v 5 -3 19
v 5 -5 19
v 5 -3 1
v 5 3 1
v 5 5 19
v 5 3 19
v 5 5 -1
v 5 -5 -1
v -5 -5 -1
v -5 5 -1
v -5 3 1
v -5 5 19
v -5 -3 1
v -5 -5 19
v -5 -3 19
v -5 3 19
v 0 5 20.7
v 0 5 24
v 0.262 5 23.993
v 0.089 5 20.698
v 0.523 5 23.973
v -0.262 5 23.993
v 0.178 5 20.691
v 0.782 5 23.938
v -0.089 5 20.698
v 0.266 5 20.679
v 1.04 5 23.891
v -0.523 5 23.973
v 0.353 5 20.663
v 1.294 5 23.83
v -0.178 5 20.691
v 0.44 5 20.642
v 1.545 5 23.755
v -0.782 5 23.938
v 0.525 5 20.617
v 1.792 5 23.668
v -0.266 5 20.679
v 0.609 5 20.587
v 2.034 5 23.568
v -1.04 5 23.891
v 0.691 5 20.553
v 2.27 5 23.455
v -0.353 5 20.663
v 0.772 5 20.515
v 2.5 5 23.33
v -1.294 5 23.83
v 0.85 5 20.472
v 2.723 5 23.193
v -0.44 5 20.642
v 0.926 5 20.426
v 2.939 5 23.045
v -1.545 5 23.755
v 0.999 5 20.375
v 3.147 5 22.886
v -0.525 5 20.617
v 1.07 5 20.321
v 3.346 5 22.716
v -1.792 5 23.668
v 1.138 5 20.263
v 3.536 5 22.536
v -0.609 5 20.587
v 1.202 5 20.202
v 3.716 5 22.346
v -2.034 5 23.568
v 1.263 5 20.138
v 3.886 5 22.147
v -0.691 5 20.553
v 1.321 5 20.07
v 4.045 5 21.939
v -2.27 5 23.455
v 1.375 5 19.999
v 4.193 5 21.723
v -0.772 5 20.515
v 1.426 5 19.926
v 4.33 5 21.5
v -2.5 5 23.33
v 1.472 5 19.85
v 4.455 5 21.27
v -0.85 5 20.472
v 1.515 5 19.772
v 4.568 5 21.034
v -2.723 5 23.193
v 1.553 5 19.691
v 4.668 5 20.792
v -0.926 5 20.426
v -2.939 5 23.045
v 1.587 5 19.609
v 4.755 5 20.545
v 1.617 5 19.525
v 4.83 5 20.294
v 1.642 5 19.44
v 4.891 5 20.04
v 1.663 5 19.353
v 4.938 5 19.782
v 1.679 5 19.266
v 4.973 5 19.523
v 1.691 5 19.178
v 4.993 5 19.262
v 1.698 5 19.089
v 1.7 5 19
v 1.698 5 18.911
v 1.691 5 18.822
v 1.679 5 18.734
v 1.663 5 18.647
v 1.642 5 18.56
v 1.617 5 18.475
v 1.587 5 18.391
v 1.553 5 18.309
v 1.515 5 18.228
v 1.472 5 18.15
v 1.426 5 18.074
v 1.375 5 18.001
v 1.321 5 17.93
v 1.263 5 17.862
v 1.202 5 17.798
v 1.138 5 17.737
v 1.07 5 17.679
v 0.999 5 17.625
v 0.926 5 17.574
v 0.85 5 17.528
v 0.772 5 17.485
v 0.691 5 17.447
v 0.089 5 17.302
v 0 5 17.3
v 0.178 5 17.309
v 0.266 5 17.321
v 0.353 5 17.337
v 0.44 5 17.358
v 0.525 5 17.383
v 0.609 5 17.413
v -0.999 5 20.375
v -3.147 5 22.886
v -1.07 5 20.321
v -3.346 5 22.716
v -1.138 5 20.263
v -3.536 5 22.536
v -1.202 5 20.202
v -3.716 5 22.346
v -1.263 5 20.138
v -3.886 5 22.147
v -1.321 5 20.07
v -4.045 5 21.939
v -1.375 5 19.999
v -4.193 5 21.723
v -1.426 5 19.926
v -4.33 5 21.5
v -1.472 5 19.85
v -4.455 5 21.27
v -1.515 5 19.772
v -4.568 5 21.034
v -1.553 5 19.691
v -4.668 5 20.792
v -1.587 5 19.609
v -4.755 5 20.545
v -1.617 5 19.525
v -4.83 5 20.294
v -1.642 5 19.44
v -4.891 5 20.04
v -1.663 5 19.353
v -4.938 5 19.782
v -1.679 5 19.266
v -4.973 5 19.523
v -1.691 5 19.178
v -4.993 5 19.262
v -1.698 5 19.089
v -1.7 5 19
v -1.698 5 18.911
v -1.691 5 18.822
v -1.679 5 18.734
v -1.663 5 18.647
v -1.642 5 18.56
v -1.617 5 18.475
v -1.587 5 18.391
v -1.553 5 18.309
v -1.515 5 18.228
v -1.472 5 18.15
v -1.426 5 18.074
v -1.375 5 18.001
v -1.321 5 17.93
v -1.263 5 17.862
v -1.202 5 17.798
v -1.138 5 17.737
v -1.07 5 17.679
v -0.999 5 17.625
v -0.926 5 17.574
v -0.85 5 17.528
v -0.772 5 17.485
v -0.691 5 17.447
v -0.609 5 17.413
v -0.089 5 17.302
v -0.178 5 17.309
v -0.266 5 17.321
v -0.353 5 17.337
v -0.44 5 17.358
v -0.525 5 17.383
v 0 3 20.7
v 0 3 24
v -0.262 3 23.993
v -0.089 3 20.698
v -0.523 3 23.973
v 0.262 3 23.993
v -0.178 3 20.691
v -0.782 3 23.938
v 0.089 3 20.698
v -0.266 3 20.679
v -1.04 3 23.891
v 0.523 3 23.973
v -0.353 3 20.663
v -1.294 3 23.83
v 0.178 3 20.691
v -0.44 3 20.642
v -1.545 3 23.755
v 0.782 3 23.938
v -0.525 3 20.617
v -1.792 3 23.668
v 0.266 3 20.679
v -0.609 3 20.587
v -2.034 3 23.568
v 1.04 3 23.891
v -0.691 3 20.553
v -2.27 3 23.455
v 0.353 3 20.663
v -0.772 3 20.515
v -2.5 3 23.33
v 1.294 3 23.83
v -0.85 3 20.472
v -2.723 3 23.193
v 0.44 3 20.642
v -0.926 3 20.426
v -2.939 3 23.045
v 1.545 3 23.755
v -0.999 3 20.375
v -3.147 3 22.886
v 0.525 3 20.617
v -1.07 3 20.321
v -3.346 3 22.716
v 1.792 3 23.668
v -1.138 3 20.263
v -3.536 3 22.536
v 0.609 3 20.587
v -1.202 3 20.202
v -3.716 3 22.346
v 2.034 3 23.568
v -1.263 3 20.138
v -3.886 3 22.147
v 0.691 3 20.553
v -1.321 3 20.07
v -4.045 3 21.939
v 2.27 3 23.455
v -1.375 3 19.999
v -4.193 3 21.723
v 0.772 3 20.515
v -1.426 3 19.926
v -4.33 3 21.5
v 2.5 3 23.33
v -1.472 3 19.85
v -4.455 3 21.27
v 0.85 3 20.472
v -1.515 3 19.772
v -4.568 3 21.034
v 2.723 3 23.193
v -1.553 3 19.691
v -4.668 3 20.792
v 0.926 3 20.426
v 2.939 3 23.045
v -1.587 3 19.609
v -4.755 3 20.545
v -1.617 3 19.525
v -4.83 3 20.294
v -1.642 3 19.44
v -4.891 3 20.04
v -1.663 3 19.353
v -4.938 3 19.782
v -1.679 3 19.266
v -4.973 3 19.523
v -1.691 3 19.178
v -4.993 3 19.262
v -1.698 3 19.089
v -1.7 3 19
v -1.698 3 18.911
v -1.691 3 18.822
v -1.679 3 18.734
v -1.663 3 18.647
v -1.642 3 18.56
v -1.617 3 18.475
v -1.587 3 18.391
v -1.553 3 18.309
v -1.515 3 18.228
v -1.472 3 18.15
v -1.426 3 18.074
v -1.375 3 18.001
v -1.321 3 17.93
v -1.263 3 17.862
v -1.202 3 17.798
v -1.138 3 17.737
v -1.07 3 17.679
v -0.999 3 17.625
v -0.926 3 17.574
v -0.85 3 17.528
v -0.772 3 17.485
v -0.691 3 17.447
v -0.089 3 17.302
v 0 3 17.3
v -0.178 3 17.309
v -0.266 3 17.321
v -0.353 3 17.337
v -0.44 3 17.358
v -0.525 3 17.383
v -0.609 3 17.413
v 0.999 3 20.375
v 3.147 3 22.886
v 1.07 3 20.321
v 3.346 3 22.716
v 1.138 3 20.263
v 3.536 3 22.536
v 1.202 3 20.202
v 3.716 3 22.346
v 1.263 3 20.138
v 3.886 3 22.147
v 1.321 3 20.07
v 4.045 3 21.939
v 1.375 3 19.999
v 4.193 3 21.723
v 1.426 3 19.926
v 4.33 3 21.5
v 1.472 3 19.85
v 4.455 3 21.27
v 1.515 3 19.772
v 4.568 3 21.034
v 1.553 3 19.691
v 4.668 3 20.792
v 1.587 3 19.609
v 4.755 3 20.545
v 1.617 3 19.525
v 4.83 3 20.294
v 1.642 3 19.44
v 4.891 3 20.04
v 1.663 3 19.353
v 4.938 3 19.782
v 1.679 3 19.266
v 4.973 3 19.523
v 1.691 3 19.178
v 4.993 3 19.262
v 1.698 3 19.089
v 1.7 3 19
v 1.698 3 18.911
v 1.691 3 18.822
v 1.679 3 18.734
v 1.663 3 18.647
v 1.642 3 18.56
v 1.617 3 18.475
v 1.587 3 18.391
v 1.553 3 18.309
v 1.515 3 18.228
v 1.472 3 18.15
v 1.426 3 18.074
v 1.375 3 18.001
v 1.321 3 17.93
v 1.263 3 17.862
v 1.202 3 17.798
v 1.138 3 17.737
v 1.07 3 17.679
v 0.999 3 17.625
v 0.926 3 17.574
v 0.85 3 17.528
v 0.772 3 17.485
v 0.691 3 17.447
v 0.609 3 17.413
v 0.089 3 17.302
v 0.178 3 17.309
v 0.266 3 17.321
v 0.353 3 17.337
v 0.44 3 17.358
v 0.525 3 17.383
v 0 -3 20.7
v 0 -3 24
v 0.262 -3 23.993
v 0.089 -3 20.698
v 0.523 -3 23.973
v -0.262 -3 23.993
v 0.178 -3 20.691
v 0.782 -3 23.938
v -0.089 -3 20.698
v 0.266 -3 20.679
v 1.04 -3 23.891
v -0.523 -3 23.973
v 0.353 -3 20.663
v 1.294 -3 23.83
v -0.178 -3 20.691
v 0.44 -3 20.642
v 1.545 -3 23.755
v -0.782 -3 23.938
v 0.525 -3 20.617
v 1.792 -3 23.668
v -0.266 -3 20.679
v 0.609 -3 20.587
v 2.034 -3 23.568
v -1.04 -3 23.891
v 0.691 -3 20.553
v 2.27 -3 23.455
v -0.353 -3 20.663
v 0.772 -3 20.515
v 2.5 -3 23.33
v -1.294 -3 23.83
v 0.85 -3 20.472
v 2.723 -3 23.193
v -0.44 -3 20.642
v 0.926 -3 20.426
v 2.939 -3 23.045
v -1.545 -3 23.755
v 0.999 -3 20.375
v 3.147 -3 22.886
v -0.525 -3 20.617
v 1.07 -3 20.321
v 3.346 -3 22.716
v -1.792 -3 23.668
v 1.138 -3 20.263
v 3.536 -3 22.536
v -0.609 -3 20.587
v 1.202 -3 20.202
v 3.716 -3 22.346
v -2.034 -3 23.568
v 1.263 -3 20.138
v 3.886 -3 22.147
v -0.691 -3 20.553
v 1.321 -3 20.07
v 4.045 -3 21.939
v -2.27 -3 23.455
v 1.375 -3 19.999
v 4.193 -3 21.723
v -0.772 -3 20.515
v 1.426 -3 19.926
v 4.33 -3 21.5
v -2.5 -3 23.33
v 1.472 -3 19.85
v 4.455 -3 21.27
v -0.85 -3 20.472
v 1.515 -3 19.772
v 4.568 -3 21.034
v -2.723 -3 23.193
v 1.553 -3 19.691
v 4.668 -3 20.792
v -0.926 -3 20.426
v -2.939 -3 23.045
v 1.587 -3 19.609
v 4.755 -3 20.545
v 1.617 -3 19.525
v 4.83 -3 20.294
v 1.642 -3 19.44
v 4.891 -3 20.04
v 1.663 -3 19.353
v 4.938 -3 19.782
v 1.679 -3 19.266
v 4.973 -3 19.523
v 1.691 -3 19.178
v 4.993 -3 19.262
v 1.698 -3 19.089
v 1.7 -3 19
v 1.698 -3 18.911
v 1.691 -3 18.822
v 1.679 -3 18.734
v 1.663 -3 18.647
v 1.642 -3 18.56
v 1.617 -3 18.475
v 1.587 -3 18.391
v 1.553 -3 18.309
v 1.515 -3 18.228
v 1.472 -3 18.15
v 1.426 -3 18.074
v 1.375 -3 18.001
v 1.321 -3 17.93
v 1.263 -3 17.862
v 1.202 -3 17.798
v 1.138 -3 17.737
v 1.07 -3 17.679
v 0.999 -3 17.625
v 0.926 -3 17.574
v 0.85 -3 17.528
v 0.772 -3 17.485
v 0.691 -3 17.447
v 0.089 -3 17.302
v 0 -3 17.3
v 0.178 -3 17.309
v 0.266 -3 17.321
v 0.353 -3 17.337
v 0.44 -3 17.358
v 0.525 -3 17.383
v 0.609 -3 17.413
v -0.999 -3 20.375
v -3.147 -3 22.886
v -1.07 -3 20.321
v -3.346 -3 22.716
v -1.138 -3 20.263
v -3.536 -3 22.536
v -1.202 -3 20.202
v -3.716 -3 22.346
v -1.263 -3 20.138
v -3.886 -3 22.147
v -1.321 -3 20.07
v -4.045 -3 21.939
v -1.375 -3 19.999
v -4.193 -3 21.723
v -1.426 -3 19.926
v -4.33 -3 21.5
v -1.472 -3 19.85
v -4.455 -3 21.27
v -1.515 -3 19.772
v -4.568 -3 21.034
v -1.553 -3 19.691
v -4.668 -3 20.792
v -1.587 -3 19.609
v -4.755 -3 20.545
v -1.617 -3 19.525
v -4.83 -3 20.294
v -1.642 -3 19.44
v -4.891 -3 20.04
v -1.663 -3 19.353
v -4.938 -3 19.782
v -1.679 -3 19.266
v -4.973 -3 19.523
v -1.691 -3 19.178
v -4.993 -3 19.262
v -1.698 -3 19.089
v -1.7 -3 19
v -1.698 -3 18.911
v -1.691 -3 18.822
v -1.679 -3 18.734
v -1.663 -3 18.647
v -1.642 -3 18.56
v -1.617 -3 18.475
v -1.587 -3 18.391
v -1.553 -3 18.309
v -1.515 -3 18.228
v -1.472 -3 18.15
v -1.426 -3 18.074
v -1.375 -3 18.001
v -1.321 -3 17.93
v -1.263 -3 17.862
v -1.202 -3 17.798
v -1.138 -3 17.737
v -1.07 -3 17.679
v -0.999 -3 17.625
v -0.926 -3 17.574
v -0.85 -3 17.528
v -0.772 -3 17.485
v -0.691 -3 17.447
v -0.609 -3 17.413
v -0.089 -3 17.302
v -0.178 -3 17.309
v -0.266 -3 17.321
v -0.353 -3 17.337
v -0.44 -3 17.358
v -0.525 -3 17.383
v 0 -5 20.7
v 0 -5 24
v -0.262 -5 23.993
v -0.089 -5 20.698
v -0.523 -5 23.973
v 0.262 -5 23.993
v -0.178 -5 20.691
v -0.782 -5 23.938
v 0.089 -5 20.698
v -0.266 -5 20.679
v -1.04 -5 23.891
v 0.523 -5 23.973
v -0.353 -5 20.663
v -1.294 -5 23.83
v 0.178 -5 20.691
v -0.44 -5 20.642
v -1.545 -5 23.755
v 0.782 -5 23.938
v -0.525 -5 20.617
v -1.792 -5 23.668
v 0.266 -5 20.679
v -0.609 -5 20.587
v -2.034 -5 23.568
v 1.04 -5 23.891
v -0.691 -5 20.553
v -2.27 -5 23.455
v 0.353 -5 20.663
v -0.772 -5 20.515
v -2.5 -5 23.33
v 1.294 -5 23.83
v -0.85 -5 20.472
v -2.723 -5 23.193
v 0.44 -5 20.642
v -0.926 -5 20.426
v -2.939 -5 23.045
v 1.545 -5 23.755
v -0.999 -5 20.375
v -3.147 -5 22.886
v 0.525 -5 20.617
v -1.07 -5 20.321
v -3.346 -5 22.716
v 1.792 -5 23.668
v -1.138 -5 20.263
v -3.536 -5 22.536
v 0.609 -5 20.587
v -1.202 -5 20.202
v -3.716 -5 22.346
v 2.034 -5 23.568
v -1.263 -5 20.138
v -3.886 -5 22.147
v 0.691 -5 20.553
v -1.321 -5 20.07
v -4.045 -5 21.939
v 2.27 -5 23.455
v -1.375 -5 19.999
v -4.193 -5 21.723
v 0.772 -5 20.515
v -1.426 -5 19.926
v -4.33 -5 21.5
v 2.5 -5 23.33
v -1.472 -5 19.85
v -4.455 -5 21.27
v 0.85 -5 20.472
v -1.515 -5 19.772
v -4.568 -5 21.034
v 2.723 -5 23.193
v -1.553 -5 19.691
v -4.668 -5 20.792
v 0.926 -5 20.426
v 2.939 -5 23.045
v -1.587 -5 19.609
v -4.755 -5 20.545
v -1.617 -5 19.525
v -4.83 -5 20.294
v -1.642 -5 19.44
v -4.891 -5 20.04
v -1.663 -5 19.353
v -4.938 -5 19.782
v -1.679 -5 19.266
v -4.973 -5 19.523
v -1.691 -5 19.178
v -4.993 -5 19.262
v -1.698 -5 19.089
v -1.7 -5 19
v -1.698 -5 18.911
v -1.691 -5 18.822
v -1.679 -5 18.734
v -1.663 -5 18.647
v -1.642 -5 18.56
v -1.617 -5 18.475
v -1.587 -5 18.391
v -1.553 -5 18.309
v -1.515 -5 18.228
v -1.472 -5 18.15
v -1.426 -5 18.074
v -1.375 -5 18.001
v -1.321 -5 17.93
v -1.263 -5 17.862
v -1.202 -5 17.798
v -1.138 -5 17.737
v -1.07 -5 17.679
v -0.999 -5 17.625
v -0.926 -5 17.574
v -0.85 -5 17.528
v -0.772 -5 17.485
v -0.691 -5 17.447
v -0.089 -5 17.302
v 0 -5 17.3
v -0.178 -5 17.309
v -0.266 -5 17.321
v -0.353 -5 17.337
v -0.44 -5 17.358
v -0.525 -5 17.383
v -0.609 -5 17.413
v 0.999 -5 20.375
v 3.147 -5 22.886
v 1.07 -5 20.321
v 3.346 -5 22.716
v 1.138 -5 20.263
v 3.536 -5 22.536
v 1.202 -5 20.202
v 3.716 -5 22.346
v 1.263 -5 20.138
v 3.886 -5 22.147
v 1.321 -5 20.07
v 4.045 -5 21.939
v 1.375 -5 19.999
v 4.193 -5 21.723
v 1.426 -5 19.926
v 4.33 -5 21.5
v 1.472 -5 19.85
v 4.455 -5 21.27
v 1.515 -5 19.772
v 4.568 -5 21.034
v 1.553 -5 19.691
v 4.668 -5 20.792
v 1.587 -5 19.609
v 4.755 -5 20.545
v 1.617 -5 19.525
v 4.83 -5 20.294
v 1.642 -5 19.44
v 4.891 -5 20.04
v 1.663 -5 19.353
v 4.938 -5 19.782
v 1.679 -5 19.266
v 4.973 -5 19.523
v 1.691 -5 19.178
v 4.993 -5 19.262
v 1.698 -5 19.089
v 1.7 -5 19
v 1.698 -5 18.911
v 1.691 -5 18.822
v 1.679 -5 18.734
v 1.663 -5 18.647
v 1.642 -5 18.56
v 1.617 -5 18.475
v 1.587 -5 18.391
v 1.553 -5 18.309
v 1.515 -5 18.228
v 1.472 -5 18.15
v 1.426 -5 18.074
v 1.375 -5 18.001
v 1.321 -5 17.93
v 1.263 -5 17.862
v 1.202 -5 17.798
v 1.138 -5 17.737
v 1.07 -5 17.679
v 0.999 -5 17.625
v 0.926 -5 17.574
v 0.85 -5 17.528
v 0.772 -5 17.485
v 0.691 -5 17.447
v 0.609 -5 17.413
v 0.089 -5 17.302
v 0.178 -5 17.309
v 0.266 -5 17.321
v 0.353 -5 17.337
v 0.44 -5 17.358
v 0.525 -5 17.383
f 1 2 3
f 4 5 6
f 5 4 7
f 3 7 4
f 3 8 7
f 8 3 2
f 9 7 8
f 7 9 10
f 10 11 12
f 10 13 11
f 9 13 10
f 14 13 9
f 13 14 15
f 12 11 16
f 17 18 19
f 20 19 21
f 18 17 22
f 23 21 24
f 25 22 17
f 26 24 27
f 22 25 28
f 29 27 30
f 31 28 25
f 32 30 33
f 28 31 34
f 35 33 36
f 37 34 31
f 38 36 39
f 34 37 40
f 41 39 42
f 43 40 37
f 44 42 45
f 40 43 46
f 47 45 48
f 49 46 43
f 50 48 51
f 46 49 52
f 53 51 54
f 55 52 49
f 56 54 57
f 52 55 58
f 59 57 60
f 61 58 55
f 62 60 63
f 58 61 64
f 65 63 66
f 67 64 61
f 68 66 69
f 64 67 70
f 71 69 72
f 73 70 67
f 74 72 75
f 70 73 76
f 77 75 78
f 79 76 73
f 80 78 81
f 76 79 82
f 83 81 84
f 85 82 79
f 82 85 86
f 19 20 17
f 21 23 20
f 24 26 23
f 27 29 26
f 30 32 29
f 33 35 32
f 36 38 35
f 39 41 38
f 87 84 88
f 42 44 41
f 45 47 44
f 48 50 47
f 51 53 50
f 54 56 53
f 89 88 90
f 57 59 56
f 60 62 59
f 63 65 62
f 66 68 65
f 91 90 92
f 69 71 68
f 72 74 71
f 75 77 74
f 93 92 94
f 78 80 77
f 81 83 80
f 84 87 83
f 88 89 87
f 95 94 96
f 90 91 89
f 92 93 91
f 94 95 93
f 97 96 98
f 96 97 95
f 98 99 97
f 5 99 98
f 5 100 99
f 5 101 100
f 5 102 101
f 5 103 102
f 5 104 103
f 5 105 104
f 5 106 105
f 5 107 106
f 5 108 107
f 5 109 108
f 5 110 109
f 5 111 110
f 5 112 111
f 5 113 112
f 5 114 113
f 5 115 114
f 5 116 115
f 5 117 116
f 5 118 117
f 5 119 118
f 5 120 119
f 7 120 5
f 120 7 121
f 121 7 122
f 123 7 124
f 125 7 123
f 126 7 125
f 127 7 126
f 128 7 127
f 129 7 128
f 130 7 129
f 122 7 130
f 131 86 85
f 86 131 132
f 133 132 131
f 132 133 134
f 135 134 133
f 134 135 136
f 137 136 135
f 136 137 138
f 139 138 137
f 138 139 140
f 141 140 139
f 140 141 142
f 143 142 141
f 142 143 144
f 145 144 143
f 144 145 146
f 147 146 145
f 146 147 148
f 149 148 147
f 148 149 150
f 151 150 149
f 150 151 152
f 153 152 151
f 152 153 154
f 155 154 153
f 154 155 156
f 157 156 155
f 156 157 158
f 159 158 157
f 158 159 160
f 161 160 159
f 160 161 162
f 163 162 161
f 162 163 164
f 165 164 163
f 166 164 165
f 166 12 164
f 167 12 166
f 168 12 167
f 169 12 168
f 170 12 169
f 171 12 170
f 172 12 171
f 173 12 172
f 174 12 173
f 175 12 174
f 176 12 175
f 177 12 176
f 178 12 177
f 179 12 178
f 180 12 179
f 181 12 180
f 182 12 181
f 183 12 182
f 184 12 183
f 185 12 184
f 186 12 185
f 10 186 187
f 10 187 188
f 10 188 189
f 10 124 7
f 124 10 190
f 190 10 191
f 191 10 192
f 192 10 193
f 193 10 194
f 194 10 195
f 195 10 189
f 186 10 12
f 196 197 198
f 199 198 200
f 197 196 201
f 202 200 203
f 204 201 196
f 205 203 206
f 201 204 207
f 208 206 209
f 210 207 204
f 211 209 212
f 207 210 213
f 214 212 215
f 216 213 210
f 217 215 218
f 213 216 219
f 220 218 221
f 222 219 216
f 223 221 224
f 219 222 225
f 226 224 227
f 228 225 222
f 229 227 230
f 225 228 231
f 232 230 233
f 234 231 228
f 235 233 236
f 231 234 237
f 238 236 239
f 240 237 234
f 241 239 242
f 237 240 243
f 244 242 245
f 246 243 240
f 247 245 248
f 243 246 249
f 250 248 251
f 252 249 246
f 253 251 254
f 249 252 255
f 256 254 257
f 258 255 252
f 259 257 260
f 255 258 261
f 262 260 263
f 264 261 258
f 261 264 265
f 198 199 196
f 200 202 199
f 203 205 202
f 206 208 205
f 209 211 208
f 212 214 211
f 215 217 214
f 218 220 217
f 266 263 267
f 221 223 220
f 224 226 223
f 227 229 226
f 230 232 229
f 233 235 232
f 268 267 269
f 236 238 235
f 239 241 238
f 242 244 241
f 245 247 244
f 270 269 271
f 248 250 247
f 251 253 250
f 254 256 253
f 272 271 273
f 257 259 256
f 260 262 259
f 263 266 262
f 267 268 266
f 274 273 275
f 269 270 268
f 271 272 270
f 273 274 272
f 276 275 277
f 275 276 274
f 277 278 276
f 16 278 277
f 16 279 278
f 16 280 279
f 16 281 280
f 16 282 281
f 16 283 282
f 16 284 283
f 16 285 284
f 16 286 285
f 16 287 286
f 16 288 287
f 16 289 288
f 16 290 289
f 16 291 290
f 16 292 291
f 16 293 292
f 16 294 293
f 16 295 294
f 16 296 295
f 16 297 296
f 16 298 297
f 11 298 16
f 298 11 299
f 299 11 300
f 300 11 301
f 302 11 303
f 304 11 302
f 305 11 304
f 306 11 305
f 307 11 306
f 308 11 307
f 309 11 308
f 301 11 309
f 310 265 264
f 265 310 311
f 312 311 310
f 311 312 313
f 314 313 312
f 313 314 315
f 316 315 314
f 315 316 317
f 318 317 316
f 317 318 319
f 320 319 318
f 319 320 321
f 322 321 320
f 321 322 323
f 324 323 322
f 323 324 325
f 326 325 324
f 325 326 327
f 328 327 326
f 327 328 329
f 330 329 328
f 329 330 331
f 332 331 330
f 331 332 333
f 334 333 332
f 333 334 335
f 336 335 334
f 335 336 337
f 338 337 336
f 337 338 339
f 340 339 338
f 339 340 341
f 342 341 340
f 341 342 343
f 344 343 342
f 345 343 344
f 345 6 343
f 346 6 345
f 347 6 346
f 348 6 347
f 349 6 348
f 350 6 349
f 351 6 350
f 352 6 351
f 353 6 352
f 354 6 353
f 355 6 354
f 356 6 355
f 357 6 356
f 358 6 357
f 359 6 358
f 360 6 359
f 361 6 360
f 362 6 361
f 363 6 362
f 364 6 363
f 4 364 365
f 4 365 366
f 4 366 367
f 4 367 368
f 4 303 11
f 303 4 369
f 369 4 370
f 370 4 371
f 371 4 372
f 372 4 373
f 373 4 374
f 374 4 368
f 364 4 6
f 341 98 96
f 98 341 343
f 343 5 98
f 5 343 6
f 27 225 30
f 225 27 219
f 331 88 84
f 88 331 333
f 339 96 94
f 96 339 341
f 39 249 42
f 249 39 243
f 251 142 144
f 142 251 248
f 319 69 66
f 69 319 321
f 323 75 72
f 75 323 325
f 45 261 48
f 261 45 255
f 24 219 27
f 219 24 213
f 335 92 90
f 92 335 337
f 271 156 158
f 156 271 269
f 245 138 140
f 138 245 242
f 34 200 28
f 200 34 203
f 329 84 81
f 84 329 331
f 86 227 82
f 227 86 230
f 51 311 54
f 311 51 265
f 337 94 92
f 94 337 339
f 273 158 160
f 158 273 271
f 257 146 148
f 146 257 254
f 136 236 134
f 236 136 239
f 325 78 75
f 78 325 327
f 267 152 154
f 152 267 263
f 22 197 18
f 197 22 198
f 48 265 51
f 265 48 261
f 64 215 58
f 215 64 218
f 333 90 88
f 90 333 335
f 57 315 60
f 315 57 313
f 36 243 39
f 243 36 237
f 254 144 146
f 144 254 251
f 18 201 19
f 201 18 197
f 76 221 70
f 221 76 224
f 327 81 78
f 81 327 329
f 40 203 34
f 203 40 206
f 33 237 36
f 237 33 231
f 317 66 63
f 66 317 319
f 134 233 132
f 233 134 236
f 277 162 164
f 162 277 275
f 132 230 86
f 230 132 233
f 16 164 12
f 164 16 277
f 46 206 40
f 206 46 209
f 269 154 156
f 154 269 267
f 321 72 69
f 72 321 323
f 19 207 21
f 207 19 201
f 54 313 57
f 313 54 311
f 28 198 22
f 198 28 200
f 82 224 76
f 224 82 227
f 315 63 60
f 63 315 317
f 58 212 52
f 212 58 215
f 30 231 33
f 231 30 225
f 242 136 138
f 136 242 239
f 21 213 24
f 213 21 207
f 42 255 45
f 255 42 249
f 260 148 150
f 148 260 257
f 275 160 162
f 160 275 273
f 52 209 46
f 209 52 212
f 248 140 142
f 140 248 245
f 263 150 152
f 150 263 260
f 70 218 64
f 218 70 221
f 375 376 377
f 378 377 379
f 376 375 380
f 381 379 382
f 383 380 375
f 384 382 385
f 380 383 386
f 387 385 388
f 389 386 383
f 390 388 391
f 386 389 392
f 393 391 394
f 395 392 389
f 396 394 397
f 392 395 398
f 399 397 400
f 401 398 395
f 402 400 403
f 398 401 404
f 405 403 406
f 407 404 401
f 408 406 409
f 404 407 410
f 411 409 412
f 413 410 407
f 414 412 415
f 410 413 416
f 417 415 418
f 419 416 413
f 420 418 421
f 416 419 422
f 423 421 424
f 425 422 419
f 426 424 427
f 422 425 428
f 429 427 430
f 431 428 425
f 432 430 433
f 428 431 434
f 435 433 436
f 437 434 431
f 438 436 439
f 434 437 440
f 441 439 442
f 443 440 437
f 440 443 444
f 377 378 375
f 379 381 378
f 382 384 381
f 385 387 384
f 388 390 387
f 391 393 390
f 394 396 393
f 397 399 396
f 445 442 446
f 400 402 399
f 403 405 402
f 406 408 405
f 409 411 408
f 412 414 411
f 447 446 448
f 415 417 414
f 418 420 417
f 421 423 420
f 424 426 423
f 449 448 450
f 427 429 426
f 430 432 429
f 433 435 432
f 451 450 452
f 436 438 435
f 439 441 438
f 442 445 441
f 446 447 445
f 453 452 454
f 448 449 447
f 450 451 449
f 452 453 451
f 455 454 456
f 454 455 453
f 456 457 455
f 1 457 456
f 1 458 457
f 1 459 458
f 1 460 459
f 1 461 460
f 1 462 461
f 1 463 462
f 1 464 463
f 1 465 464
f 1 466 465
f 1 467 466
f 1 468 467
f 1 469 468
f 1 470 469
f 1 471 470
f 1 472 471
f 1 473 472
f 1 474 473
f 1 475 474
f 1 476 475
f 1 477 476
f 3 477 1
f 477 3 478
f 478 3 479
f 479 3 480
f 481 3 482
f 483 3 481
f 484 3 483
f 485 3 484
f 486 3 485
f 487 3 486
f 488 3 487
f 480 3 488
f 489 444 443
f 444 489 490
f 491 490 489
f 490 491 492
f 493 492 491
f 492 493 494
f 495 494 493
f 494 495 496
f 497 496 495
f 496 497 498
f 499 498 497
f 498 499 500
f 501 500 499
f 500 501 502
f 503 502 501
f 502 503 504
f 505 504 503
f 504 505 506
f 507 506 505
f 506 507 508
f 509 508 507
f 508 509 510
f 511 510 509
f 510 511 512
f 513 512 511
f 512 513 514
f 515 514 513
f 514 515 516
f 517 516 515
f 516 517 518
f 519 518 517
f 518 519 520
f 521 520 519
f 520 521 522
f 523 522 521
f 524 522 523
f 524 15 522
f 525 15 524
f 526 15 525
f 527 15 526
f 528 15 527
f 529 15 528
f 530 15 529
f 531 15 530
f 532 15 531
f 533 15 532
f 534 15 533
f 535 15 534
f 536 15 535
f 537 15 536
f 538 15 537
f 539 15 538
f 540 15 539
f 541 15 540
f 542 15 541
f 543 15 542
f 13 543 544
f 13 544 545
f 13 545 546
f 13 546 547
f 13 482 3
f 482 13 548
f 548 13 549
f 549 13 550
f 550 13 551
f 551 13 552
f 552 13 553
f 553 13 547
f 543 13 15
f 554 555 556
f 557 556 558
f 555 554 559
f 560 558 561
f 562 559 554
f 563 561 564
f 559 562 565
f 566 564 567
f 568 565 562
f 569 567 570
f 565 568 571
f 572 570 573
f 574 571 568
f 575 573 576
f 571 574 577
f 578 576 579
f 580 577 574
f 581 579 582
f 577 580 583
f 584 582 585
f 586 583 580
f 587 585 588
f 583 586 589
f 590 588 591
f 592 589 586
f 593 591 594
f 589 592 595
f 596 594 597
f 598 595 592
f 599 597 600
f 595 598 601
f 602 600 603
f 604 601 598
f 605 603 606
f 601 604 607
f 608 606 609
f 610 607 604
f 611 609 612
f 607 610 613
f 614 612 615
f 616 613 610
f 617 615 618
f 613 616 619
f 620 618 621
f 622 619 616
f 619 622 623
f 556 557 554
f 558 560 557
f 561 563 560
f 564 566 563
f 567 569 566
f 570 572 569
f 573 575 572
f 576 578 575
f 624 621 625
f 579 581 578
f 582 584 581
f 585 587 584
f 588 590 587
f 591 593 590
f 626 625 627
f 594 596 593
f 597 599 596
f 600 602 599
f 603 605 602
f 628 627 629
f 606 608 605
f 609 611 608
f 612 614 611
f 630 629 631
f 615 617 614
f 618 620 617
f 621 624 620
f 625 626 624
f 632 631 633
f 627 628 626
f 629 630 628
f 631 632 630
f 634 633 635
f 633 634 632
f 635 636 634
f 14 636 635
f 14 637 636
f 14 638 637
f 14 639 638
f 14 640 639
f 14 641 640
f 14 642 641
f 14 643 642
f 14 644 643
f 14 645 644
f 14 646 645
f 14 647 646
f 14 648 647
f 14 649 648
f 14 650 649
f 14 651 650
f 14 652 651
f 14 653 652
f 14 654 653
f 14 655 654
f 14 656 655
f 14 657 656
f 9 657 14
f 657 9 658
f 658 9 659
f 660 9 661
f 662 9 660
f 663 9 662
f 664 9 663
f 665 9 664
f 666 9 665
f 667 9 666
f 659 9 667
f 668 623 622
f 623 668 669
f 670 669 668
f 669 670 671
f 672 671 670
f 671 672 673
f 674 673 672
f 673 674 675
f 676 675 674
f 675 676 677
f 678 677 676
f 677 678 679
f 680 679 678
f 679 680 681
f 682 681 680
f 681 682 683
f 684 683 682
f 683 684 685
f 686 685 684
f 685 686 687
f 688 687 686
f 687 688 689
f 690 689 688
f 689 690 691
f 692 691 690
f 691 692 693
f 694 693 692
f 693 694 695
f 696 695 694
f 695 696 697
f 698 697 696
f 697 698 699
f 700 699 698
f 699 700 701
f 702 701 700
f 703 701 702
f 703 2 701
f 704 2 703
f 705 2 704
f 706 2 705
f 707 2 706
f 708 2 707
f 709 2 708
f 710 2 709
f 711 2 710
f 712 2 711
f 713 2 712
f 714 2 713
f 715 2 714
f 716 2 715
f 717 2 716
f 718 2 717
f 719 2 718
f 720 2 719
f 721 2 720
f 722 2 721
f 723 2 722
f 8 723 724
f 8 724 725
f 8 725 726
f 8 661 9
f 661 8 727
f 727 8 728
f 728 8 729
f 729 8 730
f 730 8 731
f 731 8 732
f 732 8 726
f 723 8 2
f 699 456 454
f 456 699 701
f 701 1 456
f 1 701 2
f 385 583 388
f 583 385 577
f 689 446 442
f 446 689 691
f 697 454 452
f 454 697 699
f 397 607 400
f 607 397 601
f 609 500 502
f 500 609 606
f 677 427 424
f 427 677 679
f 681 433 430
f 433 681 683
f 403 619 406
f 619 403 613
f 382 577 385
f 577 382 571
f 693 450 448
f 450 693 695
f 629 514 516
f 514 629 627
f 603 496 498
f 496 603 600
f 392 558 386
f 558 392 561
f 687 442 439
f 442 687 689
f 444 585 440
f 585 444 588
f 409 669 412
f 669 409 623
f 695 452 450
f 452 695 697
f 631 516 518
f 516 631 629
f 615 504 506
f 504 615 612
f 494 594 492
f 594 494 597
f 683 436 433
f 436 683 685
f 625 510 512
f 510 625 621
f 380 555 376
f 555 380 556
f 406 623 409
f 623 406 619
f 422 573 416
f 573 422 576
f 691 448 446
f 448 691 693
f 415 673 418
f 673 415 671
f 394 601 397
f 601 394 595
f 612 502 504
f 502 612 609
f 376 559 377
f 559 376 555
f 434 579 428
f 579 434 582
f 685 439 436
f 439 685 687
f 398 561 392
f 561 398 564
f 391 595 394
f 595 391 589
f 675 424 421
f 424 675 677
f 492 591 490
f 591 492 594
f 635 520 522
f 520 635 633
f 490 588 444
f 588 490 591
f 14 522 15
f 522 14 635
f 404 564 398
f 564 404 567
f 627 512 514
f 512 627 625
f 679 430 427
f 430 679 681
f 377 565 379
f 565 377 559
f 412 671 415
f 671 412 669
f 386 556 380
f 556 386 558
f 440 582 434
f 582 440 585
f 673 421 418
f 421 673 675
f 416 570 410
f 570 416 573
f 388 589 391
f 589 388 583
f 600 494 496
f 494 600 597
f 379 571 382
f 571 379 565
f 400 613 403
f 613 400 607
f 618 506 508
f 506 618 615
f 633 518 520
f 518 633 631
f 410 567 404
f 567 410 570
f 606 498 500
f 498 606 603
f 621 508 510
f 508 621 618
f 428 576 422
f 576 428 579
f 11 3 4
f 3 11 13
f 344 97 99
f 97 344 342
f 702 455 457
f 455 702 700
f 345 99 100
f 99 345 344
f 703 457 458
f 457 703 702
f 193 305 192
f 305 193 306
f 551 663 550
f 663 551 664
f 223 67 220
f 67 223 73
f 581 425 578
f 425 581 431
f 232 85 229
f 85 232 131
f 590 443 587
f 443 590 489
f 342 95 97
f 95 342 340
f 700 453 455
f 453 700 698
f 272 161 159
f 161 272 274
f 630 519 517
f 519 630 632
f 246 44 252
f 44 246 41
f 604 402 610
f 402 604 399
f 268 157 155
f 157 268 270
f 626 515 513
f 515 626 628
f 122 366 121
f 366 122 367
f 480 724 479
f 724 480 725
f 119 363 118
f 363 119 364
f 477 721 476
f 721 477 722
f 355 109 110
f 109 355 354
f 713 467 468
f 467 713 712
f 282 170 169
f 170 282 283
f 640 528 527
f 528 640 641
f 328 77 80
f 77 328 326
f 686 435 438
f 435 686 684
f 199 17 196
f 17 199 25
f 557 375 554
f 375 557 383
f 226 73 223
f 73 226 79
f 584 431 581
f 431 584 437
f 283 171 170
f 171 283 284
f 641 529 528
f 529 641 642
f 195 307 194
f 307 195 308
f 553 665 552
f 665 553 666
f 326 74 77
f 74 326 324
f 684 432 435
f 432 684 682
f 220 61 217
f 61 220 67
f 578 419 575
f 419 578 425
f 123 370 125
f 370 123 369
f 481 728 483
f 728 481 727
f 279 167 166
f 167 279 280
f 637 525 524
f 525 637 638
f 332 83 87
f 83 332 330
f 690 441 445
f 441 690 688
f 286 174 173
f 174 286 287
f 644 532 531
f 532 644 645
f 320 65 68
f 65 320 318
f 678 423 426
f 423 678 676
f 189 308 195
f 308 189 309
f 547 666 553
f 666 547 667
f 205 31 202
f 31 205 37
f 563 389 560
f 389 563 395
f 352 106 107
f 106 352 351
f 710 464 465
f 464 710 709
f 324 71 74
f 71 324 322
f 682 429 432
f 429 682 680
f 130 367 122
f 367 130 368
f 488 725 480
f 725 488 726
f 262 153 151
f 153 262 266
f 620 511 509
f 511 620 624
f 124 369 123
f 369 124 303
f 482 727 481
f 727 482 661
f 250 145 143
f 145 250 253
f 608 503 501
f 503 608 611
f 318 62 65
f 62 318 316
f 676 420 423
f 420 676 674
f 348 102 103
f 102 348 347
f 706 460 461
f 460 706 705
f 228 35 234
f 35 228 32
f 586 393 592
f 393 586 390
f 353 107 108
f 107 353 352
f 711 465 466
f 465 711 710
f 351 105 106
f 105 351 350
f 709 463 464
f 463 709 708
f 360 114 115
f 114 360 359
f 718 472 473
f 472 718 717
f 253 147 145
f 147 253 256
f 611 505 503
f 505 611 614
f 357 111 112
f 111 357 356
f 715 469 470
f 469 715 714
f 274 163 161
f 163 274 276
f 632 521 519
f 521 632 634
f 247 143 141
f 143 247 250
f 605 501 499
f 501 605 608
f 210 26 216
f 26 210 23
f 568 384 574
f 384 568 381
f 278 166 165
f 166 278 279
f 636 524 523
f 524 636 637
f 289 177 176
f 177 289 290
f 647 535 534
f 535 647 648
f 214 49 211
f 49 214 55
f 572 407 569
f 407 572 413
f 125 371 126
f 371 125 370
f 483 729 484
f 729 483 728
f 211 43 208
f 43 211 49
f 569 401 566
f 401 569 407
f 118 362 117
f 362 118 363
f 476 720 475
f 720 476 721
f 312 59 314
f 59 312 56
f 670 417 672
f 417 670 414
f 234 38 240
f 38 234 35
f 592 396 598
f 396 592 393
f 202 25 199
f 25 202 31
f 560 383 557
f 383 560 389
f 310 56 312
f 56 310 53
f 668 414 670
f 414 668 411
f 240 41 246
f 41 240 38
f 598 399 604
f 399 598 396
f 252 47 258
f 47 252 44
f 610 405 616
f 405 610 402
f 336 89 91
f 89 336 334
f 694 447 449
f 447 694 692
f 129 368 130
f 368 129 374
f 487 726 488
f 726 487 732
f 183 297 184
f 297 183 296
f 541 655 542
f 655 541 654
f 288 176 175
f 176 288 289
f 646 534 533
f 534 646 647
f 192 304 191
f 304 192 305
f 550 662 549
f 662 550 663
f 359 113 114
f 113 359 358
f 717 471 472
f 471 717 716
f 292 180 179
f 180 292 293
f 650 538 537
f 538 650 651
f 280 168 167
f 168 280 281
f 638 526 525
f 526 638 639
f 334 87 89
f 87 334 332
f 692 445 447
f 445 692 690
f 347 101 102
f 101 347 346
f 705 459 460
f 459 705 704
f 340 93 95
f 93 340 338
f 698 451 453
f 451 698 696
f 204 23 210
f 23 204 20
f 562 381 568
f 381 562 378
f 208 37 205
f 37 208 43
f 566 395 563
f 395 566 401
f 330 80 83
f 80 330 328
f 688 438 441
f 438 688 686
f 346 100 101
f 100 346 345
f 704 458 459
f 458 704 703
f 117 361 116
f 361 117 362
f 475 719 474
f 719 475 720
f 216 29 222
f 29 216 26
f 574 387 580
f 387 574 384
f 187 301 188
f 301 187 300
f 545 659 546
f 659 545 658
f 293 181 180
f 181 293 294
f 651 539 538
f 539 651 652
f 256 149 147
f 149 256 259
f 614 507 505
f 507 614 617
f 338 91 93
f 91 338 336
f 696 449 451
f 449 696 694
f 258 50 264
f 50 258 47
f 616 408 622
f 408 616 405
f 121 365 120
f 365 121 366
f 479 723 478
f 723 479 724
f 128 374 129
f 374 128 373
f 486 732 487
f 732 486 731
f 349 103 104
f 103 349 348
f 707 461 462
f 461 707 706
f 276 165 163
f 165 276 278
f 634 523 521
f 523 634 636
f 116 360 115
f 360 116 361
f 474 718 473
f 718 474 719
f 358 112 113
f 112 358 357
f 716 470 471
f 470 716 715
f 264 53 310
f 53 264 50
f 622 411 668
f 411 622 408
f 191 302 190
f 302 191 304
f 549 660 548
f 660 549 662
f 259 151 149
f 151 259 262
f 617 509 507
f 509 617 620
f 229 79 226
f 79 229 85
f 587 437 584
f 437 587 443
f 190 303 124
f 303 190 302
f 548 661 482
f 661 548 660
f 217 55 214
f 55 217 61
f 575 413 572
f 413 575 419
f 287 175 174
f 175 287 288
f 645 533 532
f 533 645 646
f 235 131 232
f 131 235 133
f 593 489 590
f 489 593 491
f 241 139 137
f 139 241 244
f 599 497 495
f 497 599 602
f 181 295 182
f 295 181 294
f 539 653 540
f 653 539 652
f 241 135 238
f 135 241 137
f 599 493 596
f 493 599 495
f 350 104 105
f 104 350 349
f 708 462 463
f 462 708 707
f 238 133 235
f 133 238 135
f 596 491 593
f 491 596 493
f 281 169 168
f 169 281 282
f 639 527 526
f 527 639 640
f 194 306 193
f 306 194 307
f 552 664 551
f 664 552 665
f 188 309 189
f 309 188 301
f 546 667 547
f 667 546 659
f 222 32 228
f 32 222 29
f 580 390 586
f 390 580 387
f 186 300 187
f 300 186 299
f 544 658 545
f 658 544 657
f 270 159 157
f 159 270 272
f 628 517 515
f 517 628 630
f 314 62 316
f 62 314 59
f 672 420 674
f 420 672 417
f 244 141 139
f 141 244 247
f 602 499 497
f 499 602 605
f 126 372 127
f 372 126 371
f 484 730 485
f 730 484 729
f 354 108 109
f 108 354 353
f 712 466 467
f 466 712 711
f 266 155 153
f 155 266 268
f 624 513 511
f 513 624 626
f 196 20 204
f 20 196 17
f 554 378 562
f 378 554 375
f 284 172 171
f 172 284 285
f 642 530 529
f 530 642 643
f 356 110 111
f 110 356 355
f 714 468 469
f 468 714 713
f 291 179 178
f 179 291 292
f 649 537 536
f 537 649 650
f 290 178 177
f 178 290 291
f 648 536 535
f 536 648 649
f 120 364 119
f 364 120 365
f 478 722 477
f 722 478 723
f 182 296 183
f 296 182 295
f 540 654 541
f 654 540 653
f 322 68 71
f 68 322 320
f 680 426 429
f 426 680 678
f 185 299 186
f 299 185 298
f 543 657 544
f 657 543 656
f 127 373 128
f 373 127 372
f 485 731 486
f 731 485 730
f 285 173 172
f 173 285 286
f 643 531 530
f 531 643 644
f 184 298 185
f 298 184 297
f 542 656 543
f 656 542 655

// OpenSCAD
// file: components/wheel.scad
module components_weel_WireWeelWithThrow(diam1, diam2, diam3, wheel_transition_border1, wheel_transition_border2, wheel_size, axis_throw_diam  = 0, fn = 80) {
    epsilon = 0.1;
    difference() {
        components_weel_WireWeel(diam1, diam2, diam3, wheel_transition_border1, wheel_transition_border2, wheel_size, fn);
        translate([0,0,-epsilon])
        cylinder(d = axis_throw_diam, h = wheel_size + epsilon * 2, center=false, $fn = fn);
    }
}


module components_weel_WireWeel(diam1, diam2, diam3, wheel_transition_border1, wheel_transition_border2, wheel_size, fn = 80) {
    epsilon = 0.1;
    difference() {
        union() {
            wheel_flat_size = (wheel_size - wheel_transition_border1 - wheel_transition_border2);
            cylinder(h = wheel_transition_border1, r1= diam1 / 2, r2= diam2 / 2, $fn = fn);

            translate([0,0,wheel_transition_border1]) {
                cylinder(h = wheel_flat_size, r = diam2 / 2, $fn = fn);
                translate([0,0,wheel_flat_size]) {
                    cylinder(h = wheel_transition_border2, r1= diam2 / 2, r2 = diam3 / 2, $fn = fn);
                }
            }
        }
        translate([0,0,-epsilon])
        cylinder(d = axis_throw_diam, h = wheel_size + epsilon * 2, center=false, $fn = fn);
    }
}
// main file
include <components/wheel.scad>

Pulley();

module Pulley() {

    //include <params/support-wheel.scad>

    pulley_thickness = 2;
    pulley_width = 10;
    pulley_height = 20;
    pulley_separation_distance = 10;

    puller_throws = 3.4;

    fn = 120;

    difference(){
        union() {
            cube([pulley_width, pulley_separation_distance, pulley_thickness], center=true);

            translate([0, pulley_separation_distance / 2 - pulley_thickness / 2, - pulley_thickness / 2 + pulley_height / 2]) {
                union() {
                    cube([pulley_width, pulley_thickness, pulley_height], center=true);
                    translate([0,0,pulley_height / 2])
                    rotate([90,0,0])
                    cylinder(h = pulley_thickness, d = pulley_width, center = true, $fn = fn);
                }
            }

            translate([0, - pulley_separation_distance / 2 + pulley_thickness / 2, - pulley_thickness / 2 + pulley_height / 2]) {
                union() {
                    cube([pulley_width, pulley_thickness, pulley_height], center=true);
                    translate([0,0,pulley_height / 2])
                    rotate([90,0,0])
                    cylinder(h = pulley_thickness, d = pulley_width, center = true, $fn = fn);
                }
            }
        }
        translate([0,0,pulley_height - pulley_thickness / 2])
        rotate([90,0,0])
        cylinder(h = pulley_separation_distance * 2, d = puller_throws, center = true, $fn = fn);
    }
}
